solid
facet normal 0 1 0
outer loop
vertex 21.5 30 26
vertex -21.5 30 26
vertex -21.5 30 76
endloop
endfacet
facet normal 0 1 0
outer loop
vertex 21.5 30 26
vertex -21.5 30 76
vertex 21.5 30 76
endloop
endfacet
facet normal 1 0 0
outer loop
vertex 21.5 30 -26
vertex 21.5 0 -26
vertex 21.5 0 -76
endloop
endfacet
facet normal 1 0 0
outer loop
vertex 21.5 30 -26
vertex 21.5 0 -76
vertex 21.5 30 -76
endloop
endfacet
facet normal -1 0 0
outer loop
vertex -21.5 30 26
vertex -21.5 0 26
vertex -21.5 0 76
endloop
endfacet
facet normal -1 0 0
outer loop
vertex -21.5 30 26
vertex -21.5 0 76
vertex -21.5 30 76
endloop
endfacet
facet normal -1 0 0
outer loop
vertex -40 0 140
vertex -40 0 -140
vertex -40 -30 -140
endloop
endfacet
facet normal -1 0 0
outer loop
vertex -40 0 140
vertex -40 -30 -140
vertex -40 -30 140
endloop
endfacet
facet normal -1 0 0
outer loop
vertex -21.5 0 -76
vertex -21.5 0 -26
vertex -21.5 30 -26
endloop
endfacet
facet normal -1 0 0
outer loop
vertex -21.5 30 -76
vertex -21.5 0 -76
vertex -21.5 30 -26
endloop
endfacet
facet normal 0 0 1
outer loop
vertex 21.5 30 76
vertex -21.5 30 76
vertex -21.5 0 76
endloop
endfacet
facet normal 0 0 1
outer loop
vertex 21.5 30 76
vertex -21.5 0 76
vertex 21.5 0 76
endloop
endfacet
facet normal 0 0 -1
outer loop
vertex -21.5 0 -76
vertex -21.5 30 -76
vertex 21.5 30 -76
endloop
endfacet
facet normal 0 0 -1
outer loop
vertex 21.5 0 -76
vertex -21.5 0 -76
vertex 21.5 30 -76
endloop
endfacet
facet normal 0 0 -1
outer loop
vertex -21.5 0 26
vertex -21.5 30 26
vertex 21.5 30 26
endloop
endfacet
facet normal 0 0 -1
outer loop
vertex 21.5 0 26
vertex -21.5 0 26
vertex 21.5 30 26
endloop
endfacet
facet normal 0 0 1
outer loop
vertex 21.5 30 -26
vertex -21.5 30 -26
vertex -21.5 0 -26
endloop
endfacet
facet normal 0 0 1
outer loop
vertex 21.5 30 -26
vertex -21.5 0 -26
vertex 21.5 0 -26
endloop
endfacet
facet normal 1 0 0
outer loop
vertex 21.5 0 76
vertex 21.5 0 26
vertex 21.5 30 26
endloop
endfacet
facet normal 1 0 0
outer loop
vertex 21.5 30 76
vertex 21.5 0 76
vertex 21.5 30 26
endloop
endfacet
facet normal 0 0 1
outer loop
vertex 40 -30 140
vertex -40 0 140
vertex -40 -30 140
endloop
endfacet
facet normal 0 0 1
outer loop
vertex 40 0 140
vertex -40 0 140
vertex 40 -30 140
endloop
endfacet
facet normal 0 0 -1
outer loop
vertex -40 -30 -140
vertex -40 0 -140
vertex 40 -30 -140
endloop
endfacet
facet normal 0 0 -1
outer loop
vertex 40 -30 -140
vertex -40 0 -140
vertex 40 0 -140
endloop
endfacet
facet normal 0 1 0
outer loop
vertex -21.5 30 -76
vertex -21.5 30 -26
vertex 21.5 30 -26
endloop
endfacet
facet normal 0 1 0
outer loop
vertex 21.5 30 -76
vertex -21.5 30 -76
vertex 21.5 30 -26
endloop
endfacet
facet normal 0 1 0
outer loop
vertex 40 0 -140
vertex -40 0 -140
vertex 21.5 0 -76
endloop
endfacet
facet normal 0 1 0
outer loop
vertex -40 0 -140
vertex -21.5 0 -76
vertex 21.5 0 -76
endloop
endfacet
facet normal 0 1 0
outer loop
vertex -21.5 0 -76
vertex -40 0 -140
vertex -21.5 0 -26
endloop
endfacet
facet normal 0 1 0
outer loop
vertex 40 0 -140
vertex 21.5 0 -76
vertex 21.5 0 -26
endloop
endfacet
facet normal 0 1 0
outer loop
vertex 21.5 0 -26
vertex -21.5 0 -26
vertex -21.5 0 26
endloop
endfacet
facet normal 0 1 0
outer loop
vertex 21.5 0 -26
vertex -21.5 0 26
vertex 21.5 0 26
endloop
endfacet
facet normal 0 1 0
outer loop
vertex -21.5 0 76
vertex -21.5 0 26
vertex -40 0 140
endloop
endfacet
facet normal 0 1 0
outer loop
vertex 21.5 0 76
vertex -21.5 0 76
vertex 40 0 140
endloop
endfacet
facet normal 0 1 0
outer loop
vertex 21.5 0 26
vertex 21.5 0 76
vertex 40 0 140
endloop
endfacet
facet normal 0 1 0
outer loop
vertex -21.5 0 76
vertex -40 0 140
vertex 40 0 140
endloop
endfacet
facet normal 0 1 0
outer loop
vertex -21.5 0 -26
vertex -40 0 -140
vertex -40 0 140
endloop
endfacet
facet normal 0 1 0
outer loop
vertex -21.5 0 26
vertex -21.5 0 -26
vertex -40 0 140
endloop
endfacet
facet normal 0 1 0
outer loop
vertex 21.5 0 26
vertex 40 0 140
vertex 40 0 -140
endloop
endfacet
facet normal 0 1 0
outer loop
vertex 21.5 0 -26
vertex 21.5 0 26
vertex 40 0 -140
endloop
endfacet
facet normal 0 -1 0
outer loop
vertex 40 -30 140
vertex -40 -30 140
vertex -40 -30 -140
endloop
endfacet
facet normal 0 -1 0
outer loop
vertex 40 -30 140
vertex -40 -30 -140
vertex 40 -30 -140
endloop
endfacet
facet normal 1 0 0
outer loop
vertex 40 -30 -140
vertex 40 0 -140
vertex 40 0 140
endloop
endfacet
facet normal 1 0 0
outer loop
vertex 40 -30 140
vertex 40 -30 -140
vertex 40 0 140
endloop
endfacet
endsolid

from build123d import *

# Parameters (mm, degrees)
F0_W     = 80
F0_H     = 280
F1_DEPTH = 30
F3_START = 26
F2_W     = 43
F2_H     = 30
F3_DEPTH = 50
F4_START = -26
F4_DEPTH = 50


with BuildPart() as f1:
    # F0 (on Front) → F1 (new body)
    with BuildSketch(Plane.XZ):
        Rectangle(F0_W, F0_H)
    extrude(amount=F1_DEPTH)

    # F2 (on Top) → F3 (join)
    with BuildSketch(Plane.XY.offset(F3_START)):
        with Locations((0, 15)):
            Rectangle(F2_W, F2_H)
    extrude(amount=F3_DEPTH)

    # F2 (on Top) → F4 (join)
    with BuildSketch(Plane.XY.offset(F4_START)):
        with Locations((0, 15)):
            Rectangle(F2_W, F2_H)
    extrude(amount=-F4_DEPTH)


solid = f1.part
